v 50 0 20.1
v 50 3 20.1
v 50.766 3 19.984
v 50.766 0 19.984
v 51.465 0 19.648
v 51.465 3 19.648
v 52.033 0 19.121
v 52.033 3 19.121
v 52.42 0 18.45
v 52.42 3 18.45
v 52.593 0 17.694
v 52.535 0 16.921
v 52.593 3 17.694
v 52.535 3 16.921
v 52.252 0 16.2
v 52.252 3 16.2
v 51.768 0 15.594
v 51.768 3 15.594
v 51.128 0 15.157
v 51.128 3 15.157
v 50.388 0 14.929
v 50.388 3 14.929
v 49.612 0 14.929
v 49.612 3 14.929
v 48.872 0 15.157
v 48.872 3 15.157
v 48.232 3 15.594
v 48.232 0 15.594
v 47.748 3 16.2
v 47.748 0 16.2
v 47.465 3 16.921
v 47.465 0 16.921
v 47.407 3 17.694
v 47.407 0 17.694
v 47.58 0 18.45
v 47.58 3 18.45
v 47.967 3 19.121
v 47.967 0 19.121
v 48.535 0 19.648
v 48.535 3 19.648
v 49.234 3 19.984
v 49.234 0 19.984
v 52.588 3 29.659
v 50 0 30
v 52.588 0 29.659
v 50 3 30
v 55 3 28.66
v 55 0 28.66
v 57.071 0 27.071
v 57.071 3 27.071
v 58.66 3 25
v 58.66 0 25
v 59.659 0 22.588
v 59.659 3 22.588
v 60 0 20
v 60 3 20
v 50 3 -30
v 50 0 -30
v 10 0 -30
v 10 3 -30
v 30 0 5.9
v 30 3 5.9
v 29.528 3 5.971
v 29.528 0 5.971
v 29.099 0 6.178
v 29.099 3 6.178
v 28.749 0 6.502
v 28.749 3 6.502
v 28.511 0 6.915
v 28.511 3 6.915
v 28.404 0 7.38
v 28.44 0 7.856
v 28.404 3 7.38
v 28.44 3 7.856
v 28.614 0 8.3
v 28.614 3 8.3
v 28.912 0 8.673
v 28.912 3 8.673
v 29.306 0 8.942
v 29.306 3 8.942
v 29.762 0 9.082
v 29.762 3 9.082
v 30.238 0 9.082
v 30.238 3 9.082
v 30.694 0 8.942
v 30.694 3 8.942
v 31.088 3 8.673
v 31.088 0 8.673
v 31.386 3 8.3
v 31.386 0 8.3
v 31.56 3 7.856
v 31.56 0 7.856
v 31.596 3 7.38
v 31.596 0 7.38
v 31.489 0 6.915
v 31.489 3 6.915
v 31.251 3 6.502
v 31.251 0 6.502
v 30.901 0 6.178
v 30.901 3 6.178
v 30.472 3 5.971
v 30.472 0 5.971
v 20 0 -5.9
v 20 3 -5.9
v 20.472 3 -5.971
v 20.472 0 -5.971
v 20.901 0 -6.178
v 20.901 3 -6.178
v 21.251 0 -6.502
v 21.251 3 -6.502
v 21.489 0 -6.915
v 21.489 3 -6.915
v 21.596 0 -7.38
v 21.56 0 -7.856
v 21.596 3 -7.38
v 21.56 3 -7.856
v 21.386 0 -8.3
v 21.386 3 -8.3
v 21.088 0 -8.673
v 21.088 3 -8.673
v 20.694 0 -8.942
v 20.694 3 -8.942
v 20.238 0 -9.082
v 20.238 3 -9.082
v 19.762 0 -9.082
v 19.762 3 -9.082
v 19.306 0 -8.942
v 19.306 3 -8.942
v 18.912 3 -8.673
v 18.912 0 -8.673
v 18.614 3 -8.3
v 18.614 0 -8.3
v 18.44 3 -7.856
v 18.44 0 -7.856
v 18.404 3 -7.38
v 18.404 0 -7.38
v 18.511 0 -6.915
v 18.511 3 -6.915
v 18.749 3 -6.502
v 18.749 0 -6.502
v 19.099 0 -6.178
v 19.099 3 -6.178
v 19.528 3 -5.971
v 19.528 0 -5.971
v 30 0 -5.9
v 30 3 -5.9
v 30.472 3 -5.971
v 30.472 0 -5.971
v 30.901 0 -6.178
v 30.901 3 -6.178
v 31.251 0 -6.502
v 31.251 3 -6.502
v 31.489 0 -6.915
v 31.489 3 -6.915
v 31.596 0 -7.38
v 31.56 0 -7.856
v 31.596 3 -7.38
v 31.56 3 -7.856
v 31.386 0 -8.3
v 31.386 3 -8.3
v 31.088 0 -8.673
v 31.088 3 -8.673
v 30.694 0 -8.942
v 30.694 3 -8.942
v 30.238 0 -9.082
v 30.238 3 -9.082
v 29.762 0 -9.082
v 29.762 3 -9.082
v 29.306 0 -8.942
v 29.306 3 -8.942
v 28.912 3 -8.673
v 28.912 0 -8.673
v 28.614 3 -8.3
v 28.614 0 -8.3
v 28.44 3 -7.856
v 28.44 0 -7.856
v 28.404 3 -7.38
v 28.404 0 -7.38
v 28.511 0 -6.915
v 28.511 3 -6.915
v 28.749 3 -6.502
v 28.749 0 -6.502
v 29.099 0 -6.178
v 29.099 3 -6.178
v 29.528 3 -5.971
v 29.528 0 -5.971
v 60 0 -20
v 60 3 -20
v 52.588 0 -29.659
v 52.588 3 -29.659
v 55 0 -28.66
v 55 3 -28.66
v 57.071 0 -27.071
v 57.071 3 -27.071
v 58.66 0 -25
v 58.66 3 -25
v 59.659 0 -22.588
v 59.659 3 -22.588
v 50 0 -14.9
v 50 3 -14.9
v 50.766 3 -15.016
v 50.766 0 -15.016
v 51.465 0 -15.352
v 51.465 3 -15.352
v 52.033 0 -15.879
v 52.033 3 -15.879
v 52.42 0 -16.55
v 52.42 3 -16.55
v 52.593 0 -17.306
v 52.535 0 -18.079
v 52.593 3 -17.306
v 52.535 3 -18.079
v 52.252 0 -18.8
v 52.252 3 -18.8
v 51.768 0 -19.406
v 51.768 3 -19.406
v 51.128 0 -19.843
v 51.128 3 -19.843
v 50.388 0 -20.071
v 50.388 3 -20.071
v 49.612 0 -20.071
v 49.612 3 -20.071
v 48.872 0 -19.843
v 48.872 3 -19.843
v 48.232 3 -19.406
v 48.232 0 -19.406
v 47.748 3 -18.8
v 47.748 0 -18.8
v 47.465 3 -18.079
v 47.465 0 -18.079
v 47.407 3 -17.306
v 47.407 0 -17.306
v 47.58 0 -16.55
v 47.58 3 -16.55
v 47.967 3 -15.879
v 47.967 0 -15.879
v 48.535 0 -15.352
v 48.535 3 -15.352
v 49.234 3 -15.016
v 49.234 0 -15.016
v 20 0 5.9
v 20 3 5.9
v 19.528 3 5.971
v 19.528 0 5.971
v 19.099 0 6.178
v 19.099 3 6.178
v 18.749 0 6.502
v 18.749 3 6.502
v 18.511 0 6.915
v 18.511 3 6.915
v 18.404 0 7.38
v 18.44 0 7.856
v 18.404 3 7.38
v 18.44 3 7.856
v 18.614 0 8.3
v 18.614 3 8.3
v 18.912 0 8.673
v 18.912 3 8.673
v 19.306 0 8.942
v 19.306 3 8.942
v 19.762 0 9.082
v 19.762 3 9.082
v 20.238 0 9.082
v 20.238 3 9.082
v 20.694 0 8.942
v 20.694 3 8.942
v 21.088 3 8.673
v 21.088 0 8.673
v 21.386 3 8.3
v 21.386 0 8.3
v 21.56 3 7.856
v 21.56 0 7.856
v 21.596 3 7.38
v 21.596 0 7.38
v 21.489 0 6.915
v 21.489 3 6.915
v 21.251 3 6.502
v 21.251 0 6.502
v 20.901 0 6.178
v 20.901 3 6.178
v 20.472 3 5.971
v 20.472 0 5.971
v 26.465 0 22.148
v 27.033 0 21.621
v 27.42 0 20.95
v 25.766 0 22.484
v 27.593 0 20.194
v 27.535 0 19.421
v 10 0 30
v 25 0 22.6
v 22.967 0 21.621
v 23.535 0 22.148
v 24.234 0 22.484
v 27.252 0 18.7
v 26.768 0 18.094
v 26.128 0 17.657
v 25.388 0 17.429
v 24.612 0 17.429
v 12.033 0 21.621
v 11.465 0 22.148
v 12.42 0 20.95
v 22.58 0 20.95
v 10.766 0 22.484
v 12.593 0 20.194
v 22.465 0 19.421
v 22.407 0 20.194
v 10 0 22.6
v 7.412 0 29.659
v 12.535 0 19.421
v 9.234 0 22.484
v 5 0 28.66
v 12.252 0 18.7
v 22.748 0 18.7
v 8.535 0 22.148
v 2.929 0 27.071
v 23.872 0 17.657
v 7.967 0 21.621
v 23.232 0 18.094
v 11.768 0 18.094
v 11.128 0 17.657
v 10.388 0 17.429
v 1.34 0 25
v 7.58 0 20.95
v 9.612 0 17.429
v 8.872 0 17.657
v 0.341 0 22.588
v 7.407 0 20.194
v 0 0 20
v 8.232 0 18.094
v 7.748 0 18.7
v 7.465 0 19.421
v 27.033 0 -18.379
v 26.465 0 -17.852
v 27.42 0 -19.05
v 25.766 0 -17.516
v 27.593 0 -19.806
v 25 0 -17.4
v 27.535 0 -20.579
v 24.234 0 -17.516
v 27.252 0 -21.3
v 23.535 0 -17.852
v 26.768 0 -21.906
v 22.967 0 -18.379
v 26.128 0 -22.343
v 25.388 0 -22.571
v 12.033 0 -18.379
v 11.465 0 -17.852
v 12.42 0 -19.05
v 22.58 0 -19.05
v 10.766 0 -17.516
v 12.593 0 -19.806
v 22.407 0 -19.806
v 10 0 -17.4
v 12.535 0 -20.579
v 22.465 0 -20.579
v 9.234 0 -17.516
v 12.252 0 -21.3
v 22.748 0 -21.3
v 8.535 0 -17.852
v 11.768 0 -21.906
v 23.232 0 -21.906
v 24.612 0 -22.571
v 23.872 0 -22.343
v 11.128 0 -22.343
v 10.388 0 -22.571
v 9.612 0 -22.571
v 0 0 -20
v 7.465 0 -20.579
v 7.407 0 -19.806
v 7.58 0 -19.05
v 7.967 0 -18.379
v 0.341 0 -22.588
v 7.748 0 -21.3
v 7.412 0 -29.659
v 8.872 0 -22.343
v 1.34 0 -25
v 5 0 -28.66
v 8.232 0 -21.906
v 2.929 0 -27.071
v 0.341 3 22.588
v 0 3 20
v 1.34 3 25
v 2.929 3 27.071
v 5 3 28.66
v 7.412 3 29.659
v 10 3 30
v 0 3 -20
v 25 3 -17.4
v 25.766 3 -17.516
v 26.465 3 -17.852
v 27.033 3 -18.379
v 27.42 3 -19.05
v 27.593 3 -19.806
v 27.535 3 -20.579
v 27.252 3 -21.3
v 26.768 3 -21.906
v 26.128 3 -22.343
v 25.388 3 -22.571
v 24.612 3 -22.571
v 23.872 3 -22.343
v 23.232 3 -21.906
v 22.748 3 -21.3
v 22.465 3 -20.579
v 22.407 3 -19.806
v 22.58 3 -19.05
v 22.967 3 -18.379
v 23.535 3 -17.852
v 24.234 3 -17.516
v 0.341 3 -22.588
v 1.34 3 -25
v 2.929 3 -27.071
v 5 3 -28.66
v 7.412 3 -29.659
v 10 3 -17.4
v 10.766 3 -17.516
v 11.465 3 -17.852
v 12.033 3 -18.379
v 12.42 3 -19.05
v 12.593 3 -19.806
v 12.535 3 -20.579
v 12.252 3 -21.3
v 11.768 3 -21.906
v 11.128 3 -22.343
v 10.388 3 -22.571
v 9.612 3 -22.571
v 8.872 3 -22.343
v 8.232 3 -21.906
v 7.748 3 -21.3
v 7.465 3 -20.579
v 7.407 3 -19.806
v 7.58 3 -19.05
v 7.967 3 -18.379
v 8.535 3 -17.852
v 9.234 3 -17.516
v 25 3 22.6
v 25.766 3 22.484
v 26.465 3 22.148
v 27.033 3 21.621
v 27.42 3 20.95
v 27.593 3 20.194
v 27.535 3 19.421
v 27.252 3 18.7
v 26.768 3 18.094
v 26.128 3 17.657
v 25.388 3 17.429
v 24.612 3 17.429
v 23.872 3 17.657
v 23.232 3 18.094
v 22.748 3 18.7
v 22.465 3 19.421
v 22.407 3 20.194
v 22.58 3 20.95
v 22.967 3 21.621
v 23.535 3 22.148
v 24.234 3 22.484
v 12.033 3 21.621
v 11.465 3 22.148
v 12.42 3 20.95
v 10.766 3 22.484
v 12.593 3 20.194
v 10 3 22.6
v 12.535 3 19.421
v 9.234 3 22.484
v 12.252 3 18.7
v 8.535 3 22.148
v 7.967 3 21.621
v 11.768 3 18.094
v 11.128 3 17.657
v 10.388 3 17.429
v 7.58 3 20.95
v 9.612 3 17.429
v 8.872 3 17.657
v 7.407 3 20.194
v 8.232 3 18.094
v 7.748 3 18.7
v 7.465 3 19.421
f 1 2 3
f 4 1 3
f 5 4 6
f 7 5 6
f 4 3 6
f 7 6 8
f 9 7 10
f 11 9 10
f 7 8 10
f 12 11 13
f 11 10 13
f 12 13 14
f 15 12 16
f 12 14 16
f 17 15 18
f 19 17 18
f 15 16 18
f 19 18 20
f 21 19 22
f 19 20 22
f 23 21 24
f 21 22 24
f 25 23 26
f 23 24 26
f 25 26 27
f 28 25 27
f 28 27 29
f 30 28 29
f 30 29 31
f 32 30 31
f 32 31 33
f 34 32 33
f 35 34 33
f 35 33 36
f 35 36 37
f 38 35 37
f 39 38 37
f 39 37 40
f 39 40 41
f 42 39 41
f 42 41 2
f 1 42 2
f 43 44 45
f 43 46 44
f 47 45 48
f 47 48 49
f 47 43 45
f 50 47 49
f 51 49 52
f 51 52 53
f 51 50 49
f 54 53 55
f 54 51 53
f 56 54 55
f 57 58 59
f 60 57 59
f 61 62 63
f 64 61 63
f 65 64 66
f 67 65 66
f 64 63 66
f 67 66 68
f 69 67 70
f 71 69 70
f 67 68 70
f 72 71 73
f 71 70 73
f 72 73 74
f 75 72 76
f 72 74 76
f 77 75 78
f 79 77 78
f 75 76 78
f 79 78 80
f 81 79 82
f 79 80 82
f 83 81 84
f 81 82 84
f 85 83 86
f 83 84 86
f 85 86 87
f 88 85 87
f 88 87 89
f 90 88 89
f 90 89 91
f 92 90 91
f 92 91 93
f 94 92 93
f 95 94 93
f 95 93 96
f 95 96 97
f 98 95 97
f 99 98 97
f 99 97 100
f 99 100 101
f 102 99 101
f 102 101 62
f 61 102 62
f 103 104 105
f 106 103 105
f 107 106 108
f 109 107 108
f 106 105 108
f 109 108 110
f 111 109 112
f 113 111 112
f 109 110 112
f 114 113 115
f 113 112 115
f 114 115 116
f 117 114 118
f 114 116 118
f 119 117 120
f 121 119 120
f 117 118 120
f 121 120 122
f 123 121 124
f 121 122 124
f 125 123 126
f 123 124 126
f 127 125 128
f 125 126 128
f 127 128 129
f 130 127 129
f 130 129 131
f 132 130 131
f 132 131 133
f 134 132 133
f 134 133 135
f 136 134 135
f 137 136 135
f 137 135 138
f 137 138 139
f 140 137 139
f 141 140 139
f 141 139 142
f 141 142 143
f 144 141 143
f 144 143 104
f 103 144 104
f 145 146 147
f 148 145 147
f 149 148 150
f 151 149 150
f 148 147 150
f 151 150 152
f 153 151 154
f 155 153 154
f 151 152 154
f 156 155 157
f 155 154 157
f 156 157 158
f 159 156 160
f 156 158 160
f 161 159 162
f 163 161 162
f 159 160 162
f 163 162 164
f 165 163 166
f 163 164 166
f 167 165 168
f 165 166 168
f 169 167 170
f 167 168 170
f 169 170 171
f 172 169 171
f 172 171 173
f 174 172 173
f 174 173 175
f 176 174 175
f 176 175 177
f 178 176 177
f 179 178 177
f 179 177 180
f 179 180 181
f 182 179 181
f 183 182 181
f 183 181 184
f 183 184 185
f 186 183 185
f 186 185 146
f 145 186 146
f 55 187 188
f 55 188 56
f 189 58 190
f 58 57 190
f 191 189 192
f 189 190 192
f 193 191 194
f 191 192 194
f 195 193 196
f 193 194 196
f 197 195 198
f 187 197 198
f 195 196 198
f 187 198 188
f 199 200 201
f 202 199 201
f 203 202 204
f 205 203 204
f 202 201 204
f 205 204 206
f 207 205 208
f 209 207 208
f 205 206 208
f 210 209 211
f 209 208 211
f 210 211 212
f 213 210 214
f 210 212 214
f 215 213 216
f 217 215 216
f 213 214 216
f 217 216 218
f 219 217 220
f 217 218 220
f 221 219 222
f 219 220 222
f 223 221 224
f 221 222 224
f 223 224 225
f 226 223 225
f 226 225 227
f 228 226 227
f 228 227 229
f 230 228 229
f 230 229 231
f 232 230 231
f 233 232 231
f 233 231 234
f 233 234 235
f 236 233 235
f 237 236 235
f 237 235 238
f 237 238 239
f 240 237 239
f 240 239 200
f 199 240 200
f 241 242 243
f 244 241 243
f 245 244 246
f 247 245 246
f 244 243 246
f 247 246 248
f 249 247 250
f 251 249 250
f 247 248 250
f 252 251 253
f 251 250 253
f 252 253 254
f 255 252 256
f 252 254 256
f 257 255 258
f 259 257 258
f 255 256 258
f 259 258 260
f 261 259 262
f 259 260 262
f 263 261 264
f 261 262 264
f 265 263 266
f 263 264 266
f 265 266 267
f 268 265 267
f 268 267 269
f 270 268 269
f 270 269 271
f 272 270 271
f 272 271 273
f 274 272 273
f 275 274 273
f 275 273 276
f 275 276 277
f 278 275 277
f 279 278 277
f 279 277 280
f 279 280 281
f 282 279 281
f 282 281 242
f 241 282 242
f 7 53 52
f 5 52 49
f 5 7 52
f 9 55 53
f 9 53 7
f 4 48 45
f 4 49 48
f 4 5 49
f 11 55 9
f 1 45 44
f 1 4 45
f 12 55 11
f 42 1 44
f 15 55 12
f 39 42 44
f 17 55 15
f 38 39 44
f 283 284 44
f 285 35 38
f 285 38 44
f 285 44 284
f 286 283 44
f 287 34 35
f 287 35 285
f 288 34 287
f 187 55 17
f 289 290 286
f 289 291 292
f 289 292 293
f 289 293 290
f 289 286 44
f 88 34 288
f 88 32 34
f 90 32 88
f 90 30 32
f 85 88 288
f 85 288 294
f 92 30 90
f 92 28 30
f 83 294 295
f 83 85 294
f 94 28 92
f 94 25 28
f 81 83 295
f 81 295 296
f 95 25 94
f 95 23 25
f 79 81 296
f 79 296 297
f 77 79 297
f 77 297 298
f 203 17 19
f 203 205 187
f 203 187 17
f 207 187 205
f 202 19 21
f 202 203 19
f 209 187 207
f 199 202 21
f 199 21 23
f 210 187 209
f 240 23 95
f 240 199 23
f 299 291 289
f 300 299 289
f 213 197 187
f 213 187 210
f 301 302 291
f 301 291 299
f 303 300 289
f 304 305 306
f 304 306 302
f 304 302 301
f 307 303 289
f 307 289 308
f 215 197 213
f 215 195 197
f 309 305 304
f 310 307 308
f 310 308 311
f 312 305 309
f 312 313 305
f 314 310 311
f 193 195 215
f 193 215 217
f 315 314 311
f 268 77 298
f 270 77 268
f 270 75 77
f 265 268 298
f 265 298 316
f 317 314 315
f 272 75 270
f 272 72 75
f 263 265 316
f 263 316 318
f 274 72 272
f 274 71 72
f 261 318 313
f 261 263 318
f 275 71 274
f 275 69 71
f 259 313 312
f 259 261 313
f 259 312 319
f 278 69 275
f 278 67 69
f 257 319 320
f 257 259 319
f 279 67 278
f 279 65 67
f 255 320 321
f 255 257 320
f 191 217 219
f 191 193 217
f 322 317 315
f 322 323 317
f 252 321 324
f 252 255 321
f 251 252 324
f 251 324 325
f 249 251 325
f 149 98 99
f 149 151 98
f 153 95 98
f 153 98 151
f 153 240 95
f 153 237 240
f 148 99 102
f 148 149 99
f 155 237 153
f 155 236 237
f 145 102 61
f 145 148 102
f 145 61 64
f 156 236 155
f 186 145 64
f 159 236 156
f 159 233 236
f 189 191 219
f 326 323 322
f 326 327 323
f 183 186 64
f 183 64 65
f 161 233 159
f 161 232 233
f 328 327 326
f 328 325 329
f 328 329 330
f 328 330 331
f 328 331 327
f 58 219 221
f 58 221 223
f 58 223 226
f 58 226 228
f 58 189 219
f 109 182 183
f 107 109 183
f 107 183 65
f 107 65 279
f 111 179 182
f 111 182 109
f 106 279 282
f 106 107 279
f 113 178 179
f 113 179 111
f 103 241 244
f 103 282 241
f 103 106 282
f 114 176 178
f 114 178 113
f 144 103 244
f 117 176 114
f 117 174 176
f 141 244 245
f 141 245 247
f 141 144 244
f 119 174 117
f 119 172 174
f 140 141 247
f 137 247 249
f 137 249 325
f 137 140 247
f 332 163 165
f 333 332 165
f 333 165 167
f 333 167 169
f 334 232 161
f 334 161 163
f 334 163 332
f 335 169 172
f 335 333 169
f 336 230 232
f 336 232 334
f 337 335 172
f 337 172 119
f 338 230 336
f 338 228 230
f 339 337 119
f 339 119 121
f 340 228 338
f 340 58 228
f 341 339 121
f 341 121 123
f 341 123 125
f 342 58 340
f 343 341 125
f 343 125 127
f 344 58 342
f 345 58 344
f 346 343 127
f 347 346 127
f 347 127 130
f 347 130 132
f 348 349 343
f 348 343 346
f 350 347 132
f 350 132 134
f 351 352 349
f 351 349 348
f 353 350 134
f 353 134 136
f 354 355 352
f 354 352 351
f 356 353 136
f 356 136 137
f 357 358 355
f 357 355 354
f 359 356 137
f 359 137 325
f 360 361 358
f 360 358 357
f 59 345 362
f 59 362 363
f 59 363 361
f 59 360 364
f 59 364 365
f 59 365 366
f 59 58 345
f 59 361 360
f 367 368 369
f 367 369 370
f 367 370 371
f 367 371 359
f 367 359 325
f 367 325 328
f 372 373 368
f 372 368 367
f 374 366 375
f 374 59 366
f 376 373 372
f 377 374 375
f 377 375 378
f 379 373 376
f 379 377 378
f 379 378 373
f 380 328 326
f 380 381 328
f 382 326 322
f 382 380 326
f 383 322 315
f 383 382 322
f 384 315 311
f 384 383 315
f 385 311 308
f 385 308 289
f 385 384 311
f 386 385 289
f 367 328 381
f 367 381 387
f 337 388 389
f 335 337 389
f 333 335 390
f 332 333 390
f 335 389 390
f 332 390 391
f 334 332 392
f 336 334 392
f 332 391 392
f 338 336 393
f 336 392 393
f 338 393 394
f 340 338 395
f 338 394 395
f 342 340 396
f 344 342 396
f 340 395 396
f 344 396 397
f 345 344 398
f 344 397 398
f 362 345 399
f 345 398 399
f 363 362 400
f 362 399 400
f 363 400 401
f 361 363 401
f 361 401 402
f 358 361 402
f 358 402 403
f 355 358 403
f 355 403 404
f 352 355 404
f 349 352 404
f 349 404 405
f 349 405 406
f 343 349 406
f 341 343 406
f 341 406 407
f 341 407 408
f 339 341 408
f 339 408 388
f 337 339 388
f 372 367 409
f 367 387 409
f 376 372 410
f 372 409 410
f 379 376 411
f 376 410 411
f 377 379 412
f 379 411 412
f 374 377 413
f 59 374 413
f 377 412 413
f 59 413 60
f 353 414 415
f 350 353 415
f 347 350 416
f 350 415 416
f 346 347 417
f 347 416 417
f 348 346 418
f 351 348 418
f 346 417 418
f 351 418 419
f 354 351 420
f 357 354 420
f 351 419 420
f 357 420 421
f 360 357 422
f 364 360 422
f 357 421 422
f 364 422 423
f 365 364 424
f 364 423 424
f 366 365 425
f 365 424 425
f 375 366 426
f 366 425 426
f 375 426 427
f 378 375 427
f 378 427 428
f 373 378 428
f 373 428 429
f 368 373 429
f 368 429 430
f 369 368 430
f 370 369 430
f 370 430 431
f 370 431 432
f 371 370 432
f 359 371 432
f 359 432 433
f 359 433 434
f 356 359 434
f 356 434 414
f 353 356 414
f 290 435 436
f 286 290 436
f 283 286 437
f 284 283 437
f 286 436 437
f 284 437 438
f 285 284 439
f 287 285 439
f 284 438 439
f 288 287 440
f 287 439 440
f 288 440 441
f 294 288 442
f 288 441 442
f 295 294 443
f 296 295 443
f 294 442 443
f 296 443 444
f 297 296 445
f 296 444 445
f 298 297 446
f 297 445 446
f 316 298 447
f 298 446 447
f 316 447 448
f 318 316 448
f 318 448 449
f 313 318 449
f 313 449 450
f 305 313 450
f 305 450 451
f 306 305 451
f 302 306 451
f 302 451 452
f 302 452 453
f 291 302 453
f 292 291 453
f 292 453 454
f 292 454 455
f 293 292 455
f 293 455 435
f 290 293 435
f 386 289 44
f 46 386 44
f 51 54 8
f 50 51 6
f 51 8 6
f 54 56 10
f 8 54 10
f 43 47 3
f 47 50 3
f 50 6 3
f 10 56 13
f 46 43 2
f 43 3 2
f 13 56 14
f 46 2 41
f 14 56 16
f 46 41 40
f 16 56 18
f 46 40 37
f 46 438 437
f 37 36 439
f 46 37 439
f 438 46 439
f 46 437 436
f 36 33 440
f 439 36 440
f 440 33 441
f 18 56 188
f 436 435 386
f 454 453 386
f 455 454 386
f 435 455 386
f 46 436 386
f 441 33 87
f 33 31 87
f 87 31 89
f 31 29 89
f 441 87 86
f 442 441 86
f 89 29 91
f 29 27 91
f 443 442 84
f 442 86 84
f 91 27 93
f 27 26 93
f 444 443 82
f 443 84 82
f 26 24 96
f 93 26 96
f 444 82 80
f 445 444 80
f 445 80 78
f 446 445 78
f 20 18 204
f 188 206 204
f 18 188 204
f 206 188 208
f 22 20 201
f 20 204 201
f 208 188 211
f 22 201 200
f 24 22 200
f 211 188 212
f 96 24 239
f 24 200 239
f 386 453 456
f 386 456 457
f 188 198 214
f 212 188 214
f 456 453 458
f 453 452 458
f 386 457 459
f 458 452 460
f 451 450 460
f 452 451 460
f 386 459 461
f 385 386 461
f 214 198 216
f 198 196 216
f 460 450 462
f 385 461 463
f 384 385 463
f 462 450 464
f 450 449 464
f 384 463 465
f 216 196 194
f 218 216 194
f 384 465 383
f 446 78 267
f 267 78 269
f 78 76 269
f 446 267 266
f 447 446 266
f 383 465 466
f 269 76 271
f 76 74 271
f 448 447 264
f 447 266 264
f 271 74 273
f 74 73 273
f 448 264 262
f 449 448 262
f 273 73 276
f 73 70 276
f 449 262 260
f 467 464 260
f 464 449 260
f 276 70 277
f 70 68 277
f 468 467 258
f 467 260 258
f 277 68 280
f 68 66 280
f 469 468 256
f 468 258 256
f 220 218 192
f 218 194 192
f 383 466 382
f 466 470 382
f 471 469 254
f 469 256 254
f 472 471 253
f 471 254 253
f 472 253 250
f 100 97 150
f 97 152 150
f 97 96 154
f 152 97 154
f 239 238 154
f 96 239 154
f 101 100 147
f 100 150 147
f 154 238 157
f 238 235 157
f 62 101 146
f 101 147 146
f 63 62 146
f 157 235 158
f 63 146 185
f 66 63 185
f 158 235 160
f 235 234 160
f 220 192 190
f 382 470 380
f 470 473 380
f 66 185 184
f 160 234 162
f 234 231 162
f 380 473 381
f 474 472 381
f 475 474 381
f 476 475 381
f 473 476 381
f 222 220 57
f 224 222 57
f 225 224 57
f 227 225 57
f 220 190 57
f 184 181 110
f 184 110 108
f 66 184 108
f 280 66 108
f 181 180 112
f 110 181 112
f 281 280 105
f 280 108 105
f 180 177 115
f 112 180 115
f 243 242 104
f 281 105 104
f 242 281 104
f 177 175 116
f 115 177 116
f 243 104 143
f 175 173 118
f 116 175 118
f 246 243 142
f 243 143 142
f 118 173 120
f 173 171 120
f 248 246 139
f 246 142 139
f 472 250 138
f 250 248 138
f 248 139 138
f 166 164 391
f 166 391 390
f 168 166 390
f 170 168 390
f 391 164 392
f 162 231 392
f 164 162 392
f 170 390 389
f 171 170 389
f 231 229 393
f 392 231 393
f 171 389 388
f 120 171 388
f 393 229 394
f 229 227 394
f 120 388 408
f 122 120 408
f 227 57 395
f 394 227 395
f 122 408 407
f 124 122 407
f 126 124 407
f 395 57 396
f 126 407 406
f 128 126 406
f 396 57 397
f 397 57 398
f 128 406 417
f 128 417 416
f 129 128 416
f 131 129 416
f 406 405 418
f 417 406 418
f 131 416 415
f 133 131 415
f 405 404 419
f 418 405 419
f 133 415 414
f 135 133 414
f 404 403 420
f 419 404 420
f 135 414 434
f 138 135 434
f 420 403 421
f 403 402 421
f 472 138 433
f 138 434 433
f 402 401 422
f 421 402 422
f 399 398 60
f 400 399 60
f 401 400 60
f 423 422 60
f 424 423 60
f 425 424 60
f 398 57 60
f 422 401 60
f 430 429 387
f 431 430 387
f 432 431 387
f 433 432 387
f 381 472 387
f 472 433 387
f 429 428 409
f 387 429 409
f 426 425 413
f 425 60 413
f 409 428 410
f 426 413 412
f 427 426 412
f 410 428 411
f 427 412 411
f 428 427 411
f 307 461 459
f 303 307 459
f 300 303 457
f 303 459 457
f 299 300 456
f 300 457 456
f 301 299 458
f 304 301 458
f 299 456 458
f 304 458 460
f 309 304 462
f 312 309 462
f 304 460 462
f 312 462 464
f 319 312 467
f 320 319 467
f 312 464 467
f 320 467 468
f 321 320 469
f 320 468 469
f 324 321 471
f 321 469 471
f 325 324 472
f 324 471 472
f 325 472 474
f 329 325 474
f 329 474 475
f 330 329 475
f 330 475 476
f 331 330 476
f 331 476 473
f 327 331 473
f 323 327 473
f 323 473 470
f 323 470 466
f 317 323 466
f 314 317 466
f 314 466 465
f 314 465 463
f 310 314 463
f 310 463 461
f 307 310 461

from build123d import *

# Parameters (mm, degrees)
EXTRUDE_1_DEPTH     = 3
SKETCH_2_R          = 1.6
SKETCH_2_R_2        = 2.6
CUT_EXTRUDE_1_DEPTH = 68.149087857
FILLET_1_R          = 10


with BuildPart() as part:
    # 草图1 → 凸台-拉伸1 (new body)
    with BuildSketch(Plane(origin=(0, 0, 0), x_dir=(1, 0, 0), z_dir=(0, 1, 0))):
        Polygon((0, -30), (0, 30), (21.715728753, 30), (60, 30), (60, -30), (21.715728753, -30), align=None)
    extrude(amount=EXTRUDE_1_DEPTH)

    # 草图2 → 切除-拉伸1 (cut, through all)
    with BuildSketch(Plane(origin=(0, 3, 0), x_dir=(1, 0, 0), z_dir=(0, 1, 0))):
        with Locations(Location((20, 7.5, 0), (0, 0, 270))):
            Circle(SKETCH_2_R)
        with Locations(Location((30, 7.5, 0), (0, 0, 270))):
            Circle(SKETCH_2_R)
        with Locations(Location((30, -7.5, 0), (0, 0, 90))):
            Circle(SKETCH_2_R)
        with Locations(Location((20, -7.5, 0), (0, 0, 90))):
            Circle(SKETCH_2_R)
        with Locations(Location((10, 20, 0), (0, 0, 270))):
            Circle(SKETCH_2_R_2)
        with Locations(Location((10, -20, 0), (0, 0, 270))):
            Circle(SKETCH_2_R_2)
        with Locations(Location((25, 20, 0), (0, 0, 270))):
            Circle(SKETCH_2_R_2)
        with Locations(Location((25, -20, 0), (0, 0, 270))):
            Circle(SKETCH_2_R_2)
        with Locations(Location((50, 17.5, 0), (0, 0, 270))):
            Circle(SKETCH_2_R_2)
        with Locations(Location((50, -17.5, 0), (0, 0, 270))):
            Circle(SKETCH_2_R_2)
    extrude(amount=-CUT_EXTRUDE_1_DEPTH, mode=Mode.SUBTRACT)

    # 圆角1
    fillet_1_edges = [part.edges().sort_by_distance(p)[0] for p in [
        (60, 1.5, -30),
        (60, 1.5, 30),
        (0, 1.5, 30),
        (0, 1.5, -30),
    ]]
    fillet(fillet_1_edges, radius=FILLET_1_R)


solid = part.part
